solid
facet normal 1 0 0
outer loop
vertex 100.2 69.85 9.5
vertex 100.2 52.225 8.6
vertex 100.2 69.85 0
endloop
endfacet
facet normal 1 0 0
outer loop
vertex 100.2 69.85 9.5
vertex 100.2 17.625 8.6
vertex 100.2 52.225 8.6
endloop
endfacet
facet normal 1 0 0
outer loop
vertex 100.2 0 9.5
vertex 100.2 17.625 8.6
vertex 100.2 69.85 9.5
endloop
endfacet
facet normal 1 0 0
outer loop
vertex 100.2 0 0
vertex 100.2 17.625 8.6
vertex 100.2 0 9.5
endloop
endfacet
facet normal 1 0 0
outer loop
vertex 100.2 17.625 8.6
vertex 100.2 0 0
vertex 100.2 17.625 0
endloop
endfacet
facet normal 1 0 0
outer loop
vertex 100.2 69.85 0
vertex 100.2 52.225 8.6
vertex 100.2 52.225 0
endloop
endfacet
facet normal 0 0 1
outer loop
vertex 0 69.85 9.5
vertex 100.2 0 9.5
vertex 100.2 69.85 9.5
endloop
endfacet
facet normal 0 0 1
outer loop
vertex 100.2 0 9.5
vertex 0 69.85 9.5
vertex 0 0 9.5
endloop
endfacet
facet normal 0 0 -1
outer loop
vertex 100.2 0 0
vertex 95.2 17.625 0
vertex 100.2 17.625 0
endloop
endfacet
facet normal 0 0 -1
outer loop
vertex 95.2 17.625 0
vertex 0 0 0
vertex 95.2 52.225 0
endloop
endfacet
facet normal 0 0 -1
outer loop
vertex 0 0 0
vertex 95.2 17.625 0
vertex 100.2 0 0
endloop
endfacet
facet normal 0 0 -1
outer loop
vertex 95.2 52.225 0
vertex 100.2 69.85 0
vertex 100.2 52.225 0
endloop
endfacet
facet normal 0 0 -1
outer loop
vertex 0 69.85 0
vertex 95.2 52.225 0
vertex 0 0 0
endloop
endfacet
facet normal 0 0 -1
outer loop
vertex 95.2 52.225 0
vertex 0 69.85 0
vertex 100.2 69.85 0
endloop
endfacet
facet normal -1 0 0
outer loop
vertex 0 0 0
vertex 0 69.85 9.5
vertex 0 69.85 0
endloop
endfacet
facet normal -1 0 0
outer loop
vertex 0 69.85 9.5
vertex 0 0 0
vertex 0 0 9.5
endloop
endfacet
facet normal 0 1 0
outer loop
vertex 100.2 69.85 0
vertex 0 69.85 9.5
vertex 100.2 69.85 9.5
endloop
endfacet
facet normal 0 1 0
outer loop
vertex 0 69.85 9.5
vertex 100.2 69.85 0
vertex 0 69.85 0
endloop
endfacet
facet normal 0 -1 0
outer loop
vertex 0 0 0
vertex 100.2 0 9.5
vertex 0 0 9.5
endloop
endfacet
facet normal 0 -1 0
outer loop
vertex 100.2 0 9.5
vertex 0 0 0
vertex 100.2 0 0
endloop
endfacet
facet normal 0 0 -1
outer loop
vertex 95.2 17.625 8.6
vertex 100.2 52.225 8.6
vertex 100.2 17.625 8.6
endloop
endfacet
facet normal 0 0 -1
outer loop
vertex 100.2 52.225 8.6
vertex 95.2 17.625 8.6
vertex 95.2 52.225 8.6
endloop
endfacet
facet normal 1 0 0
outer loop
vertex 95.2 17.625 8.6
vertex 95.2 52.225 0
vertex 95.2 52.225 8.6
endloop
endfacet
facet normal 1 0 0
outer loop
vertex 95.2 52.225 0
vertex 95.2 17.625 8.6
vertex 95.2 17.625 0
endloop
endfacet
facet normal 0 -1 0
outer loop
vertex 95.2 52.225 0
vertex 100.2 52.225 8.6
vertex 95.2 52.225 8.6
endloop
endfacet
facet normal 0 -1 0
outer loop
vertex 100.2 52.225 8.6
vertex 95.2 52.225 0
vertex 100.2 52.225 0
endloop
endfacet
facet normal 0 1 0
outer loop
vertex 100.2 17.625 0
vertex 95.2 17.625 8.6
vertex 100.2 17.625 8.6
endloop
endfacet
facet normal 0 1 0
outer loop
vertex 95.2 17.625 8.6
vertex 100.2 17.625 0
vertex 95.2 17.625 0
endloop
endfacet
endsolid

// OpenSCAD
// Granit — simplified HDD models with SATA connector slot
//
// SATA connector position per SFF-8201 (2.5") and SFF-8301 (3.5").
// Pin positions from SFF-8223 (SATA connector specification).
//
// Usage:
//   openscad -o 2.5inch_HDD.stl -D 'drive="2.5"' hdd.scad
//   openscad -o 3.5inch_HDD_NAS.stl -D 'drive="3.5"' hdd.scad

/* [Drive Selection] */
drive = "2.5"; // [2.5, 3.5]

/* [2.5" Drive — SFF-8201] */
len_25    = 100.2;
width_25  = 69.85;
height_25 = 9.5;
// SATA connector centered on drive width; slot spans ~34.6mm
slot_y_min_25 = (69.85 - 34.6) / 2;
slot_y_max_25 = (69.85 + 34.6) / 2;

/* [3.5" Drive — SFF-8301] */
len_35    = 147.0;
width_35  = 101.6;
height_35 = 26.1;
// SATA connector centered on drive width; slot spans ~34.6mm
slot_y_min_35 = (101.6 - 34.6) / 2;
slot_y_max_35 = (101.6 + 34.6) / 2;

/* [SATA Receptacle — SFF-8223] */
slot_depth  = 5.0;  // depth into drive face
slot_height = 8.6;  // receptacle opening height

// ============================================================

l  = (drive == "2.5") ? len_25    : len_35;
w  = (drive == "2.5") ? width_25  : width_35;
h  = (drive == "2.5") ? height_25 : height_35;
sy = (drive == "2.5") ? slot_y_min_25 : slot_y_min_35;
sw = (drive == "2.5") ? slot_y_max_25 - slot_y_min_25
                      : slot_y_max_35 - slot_y_min_35;

difference() {
    cube([l, w, h]);
    translate([l - slot_depth, sy, 0])
        cube([slot_depth + 1, sw, slot_height]);
}
